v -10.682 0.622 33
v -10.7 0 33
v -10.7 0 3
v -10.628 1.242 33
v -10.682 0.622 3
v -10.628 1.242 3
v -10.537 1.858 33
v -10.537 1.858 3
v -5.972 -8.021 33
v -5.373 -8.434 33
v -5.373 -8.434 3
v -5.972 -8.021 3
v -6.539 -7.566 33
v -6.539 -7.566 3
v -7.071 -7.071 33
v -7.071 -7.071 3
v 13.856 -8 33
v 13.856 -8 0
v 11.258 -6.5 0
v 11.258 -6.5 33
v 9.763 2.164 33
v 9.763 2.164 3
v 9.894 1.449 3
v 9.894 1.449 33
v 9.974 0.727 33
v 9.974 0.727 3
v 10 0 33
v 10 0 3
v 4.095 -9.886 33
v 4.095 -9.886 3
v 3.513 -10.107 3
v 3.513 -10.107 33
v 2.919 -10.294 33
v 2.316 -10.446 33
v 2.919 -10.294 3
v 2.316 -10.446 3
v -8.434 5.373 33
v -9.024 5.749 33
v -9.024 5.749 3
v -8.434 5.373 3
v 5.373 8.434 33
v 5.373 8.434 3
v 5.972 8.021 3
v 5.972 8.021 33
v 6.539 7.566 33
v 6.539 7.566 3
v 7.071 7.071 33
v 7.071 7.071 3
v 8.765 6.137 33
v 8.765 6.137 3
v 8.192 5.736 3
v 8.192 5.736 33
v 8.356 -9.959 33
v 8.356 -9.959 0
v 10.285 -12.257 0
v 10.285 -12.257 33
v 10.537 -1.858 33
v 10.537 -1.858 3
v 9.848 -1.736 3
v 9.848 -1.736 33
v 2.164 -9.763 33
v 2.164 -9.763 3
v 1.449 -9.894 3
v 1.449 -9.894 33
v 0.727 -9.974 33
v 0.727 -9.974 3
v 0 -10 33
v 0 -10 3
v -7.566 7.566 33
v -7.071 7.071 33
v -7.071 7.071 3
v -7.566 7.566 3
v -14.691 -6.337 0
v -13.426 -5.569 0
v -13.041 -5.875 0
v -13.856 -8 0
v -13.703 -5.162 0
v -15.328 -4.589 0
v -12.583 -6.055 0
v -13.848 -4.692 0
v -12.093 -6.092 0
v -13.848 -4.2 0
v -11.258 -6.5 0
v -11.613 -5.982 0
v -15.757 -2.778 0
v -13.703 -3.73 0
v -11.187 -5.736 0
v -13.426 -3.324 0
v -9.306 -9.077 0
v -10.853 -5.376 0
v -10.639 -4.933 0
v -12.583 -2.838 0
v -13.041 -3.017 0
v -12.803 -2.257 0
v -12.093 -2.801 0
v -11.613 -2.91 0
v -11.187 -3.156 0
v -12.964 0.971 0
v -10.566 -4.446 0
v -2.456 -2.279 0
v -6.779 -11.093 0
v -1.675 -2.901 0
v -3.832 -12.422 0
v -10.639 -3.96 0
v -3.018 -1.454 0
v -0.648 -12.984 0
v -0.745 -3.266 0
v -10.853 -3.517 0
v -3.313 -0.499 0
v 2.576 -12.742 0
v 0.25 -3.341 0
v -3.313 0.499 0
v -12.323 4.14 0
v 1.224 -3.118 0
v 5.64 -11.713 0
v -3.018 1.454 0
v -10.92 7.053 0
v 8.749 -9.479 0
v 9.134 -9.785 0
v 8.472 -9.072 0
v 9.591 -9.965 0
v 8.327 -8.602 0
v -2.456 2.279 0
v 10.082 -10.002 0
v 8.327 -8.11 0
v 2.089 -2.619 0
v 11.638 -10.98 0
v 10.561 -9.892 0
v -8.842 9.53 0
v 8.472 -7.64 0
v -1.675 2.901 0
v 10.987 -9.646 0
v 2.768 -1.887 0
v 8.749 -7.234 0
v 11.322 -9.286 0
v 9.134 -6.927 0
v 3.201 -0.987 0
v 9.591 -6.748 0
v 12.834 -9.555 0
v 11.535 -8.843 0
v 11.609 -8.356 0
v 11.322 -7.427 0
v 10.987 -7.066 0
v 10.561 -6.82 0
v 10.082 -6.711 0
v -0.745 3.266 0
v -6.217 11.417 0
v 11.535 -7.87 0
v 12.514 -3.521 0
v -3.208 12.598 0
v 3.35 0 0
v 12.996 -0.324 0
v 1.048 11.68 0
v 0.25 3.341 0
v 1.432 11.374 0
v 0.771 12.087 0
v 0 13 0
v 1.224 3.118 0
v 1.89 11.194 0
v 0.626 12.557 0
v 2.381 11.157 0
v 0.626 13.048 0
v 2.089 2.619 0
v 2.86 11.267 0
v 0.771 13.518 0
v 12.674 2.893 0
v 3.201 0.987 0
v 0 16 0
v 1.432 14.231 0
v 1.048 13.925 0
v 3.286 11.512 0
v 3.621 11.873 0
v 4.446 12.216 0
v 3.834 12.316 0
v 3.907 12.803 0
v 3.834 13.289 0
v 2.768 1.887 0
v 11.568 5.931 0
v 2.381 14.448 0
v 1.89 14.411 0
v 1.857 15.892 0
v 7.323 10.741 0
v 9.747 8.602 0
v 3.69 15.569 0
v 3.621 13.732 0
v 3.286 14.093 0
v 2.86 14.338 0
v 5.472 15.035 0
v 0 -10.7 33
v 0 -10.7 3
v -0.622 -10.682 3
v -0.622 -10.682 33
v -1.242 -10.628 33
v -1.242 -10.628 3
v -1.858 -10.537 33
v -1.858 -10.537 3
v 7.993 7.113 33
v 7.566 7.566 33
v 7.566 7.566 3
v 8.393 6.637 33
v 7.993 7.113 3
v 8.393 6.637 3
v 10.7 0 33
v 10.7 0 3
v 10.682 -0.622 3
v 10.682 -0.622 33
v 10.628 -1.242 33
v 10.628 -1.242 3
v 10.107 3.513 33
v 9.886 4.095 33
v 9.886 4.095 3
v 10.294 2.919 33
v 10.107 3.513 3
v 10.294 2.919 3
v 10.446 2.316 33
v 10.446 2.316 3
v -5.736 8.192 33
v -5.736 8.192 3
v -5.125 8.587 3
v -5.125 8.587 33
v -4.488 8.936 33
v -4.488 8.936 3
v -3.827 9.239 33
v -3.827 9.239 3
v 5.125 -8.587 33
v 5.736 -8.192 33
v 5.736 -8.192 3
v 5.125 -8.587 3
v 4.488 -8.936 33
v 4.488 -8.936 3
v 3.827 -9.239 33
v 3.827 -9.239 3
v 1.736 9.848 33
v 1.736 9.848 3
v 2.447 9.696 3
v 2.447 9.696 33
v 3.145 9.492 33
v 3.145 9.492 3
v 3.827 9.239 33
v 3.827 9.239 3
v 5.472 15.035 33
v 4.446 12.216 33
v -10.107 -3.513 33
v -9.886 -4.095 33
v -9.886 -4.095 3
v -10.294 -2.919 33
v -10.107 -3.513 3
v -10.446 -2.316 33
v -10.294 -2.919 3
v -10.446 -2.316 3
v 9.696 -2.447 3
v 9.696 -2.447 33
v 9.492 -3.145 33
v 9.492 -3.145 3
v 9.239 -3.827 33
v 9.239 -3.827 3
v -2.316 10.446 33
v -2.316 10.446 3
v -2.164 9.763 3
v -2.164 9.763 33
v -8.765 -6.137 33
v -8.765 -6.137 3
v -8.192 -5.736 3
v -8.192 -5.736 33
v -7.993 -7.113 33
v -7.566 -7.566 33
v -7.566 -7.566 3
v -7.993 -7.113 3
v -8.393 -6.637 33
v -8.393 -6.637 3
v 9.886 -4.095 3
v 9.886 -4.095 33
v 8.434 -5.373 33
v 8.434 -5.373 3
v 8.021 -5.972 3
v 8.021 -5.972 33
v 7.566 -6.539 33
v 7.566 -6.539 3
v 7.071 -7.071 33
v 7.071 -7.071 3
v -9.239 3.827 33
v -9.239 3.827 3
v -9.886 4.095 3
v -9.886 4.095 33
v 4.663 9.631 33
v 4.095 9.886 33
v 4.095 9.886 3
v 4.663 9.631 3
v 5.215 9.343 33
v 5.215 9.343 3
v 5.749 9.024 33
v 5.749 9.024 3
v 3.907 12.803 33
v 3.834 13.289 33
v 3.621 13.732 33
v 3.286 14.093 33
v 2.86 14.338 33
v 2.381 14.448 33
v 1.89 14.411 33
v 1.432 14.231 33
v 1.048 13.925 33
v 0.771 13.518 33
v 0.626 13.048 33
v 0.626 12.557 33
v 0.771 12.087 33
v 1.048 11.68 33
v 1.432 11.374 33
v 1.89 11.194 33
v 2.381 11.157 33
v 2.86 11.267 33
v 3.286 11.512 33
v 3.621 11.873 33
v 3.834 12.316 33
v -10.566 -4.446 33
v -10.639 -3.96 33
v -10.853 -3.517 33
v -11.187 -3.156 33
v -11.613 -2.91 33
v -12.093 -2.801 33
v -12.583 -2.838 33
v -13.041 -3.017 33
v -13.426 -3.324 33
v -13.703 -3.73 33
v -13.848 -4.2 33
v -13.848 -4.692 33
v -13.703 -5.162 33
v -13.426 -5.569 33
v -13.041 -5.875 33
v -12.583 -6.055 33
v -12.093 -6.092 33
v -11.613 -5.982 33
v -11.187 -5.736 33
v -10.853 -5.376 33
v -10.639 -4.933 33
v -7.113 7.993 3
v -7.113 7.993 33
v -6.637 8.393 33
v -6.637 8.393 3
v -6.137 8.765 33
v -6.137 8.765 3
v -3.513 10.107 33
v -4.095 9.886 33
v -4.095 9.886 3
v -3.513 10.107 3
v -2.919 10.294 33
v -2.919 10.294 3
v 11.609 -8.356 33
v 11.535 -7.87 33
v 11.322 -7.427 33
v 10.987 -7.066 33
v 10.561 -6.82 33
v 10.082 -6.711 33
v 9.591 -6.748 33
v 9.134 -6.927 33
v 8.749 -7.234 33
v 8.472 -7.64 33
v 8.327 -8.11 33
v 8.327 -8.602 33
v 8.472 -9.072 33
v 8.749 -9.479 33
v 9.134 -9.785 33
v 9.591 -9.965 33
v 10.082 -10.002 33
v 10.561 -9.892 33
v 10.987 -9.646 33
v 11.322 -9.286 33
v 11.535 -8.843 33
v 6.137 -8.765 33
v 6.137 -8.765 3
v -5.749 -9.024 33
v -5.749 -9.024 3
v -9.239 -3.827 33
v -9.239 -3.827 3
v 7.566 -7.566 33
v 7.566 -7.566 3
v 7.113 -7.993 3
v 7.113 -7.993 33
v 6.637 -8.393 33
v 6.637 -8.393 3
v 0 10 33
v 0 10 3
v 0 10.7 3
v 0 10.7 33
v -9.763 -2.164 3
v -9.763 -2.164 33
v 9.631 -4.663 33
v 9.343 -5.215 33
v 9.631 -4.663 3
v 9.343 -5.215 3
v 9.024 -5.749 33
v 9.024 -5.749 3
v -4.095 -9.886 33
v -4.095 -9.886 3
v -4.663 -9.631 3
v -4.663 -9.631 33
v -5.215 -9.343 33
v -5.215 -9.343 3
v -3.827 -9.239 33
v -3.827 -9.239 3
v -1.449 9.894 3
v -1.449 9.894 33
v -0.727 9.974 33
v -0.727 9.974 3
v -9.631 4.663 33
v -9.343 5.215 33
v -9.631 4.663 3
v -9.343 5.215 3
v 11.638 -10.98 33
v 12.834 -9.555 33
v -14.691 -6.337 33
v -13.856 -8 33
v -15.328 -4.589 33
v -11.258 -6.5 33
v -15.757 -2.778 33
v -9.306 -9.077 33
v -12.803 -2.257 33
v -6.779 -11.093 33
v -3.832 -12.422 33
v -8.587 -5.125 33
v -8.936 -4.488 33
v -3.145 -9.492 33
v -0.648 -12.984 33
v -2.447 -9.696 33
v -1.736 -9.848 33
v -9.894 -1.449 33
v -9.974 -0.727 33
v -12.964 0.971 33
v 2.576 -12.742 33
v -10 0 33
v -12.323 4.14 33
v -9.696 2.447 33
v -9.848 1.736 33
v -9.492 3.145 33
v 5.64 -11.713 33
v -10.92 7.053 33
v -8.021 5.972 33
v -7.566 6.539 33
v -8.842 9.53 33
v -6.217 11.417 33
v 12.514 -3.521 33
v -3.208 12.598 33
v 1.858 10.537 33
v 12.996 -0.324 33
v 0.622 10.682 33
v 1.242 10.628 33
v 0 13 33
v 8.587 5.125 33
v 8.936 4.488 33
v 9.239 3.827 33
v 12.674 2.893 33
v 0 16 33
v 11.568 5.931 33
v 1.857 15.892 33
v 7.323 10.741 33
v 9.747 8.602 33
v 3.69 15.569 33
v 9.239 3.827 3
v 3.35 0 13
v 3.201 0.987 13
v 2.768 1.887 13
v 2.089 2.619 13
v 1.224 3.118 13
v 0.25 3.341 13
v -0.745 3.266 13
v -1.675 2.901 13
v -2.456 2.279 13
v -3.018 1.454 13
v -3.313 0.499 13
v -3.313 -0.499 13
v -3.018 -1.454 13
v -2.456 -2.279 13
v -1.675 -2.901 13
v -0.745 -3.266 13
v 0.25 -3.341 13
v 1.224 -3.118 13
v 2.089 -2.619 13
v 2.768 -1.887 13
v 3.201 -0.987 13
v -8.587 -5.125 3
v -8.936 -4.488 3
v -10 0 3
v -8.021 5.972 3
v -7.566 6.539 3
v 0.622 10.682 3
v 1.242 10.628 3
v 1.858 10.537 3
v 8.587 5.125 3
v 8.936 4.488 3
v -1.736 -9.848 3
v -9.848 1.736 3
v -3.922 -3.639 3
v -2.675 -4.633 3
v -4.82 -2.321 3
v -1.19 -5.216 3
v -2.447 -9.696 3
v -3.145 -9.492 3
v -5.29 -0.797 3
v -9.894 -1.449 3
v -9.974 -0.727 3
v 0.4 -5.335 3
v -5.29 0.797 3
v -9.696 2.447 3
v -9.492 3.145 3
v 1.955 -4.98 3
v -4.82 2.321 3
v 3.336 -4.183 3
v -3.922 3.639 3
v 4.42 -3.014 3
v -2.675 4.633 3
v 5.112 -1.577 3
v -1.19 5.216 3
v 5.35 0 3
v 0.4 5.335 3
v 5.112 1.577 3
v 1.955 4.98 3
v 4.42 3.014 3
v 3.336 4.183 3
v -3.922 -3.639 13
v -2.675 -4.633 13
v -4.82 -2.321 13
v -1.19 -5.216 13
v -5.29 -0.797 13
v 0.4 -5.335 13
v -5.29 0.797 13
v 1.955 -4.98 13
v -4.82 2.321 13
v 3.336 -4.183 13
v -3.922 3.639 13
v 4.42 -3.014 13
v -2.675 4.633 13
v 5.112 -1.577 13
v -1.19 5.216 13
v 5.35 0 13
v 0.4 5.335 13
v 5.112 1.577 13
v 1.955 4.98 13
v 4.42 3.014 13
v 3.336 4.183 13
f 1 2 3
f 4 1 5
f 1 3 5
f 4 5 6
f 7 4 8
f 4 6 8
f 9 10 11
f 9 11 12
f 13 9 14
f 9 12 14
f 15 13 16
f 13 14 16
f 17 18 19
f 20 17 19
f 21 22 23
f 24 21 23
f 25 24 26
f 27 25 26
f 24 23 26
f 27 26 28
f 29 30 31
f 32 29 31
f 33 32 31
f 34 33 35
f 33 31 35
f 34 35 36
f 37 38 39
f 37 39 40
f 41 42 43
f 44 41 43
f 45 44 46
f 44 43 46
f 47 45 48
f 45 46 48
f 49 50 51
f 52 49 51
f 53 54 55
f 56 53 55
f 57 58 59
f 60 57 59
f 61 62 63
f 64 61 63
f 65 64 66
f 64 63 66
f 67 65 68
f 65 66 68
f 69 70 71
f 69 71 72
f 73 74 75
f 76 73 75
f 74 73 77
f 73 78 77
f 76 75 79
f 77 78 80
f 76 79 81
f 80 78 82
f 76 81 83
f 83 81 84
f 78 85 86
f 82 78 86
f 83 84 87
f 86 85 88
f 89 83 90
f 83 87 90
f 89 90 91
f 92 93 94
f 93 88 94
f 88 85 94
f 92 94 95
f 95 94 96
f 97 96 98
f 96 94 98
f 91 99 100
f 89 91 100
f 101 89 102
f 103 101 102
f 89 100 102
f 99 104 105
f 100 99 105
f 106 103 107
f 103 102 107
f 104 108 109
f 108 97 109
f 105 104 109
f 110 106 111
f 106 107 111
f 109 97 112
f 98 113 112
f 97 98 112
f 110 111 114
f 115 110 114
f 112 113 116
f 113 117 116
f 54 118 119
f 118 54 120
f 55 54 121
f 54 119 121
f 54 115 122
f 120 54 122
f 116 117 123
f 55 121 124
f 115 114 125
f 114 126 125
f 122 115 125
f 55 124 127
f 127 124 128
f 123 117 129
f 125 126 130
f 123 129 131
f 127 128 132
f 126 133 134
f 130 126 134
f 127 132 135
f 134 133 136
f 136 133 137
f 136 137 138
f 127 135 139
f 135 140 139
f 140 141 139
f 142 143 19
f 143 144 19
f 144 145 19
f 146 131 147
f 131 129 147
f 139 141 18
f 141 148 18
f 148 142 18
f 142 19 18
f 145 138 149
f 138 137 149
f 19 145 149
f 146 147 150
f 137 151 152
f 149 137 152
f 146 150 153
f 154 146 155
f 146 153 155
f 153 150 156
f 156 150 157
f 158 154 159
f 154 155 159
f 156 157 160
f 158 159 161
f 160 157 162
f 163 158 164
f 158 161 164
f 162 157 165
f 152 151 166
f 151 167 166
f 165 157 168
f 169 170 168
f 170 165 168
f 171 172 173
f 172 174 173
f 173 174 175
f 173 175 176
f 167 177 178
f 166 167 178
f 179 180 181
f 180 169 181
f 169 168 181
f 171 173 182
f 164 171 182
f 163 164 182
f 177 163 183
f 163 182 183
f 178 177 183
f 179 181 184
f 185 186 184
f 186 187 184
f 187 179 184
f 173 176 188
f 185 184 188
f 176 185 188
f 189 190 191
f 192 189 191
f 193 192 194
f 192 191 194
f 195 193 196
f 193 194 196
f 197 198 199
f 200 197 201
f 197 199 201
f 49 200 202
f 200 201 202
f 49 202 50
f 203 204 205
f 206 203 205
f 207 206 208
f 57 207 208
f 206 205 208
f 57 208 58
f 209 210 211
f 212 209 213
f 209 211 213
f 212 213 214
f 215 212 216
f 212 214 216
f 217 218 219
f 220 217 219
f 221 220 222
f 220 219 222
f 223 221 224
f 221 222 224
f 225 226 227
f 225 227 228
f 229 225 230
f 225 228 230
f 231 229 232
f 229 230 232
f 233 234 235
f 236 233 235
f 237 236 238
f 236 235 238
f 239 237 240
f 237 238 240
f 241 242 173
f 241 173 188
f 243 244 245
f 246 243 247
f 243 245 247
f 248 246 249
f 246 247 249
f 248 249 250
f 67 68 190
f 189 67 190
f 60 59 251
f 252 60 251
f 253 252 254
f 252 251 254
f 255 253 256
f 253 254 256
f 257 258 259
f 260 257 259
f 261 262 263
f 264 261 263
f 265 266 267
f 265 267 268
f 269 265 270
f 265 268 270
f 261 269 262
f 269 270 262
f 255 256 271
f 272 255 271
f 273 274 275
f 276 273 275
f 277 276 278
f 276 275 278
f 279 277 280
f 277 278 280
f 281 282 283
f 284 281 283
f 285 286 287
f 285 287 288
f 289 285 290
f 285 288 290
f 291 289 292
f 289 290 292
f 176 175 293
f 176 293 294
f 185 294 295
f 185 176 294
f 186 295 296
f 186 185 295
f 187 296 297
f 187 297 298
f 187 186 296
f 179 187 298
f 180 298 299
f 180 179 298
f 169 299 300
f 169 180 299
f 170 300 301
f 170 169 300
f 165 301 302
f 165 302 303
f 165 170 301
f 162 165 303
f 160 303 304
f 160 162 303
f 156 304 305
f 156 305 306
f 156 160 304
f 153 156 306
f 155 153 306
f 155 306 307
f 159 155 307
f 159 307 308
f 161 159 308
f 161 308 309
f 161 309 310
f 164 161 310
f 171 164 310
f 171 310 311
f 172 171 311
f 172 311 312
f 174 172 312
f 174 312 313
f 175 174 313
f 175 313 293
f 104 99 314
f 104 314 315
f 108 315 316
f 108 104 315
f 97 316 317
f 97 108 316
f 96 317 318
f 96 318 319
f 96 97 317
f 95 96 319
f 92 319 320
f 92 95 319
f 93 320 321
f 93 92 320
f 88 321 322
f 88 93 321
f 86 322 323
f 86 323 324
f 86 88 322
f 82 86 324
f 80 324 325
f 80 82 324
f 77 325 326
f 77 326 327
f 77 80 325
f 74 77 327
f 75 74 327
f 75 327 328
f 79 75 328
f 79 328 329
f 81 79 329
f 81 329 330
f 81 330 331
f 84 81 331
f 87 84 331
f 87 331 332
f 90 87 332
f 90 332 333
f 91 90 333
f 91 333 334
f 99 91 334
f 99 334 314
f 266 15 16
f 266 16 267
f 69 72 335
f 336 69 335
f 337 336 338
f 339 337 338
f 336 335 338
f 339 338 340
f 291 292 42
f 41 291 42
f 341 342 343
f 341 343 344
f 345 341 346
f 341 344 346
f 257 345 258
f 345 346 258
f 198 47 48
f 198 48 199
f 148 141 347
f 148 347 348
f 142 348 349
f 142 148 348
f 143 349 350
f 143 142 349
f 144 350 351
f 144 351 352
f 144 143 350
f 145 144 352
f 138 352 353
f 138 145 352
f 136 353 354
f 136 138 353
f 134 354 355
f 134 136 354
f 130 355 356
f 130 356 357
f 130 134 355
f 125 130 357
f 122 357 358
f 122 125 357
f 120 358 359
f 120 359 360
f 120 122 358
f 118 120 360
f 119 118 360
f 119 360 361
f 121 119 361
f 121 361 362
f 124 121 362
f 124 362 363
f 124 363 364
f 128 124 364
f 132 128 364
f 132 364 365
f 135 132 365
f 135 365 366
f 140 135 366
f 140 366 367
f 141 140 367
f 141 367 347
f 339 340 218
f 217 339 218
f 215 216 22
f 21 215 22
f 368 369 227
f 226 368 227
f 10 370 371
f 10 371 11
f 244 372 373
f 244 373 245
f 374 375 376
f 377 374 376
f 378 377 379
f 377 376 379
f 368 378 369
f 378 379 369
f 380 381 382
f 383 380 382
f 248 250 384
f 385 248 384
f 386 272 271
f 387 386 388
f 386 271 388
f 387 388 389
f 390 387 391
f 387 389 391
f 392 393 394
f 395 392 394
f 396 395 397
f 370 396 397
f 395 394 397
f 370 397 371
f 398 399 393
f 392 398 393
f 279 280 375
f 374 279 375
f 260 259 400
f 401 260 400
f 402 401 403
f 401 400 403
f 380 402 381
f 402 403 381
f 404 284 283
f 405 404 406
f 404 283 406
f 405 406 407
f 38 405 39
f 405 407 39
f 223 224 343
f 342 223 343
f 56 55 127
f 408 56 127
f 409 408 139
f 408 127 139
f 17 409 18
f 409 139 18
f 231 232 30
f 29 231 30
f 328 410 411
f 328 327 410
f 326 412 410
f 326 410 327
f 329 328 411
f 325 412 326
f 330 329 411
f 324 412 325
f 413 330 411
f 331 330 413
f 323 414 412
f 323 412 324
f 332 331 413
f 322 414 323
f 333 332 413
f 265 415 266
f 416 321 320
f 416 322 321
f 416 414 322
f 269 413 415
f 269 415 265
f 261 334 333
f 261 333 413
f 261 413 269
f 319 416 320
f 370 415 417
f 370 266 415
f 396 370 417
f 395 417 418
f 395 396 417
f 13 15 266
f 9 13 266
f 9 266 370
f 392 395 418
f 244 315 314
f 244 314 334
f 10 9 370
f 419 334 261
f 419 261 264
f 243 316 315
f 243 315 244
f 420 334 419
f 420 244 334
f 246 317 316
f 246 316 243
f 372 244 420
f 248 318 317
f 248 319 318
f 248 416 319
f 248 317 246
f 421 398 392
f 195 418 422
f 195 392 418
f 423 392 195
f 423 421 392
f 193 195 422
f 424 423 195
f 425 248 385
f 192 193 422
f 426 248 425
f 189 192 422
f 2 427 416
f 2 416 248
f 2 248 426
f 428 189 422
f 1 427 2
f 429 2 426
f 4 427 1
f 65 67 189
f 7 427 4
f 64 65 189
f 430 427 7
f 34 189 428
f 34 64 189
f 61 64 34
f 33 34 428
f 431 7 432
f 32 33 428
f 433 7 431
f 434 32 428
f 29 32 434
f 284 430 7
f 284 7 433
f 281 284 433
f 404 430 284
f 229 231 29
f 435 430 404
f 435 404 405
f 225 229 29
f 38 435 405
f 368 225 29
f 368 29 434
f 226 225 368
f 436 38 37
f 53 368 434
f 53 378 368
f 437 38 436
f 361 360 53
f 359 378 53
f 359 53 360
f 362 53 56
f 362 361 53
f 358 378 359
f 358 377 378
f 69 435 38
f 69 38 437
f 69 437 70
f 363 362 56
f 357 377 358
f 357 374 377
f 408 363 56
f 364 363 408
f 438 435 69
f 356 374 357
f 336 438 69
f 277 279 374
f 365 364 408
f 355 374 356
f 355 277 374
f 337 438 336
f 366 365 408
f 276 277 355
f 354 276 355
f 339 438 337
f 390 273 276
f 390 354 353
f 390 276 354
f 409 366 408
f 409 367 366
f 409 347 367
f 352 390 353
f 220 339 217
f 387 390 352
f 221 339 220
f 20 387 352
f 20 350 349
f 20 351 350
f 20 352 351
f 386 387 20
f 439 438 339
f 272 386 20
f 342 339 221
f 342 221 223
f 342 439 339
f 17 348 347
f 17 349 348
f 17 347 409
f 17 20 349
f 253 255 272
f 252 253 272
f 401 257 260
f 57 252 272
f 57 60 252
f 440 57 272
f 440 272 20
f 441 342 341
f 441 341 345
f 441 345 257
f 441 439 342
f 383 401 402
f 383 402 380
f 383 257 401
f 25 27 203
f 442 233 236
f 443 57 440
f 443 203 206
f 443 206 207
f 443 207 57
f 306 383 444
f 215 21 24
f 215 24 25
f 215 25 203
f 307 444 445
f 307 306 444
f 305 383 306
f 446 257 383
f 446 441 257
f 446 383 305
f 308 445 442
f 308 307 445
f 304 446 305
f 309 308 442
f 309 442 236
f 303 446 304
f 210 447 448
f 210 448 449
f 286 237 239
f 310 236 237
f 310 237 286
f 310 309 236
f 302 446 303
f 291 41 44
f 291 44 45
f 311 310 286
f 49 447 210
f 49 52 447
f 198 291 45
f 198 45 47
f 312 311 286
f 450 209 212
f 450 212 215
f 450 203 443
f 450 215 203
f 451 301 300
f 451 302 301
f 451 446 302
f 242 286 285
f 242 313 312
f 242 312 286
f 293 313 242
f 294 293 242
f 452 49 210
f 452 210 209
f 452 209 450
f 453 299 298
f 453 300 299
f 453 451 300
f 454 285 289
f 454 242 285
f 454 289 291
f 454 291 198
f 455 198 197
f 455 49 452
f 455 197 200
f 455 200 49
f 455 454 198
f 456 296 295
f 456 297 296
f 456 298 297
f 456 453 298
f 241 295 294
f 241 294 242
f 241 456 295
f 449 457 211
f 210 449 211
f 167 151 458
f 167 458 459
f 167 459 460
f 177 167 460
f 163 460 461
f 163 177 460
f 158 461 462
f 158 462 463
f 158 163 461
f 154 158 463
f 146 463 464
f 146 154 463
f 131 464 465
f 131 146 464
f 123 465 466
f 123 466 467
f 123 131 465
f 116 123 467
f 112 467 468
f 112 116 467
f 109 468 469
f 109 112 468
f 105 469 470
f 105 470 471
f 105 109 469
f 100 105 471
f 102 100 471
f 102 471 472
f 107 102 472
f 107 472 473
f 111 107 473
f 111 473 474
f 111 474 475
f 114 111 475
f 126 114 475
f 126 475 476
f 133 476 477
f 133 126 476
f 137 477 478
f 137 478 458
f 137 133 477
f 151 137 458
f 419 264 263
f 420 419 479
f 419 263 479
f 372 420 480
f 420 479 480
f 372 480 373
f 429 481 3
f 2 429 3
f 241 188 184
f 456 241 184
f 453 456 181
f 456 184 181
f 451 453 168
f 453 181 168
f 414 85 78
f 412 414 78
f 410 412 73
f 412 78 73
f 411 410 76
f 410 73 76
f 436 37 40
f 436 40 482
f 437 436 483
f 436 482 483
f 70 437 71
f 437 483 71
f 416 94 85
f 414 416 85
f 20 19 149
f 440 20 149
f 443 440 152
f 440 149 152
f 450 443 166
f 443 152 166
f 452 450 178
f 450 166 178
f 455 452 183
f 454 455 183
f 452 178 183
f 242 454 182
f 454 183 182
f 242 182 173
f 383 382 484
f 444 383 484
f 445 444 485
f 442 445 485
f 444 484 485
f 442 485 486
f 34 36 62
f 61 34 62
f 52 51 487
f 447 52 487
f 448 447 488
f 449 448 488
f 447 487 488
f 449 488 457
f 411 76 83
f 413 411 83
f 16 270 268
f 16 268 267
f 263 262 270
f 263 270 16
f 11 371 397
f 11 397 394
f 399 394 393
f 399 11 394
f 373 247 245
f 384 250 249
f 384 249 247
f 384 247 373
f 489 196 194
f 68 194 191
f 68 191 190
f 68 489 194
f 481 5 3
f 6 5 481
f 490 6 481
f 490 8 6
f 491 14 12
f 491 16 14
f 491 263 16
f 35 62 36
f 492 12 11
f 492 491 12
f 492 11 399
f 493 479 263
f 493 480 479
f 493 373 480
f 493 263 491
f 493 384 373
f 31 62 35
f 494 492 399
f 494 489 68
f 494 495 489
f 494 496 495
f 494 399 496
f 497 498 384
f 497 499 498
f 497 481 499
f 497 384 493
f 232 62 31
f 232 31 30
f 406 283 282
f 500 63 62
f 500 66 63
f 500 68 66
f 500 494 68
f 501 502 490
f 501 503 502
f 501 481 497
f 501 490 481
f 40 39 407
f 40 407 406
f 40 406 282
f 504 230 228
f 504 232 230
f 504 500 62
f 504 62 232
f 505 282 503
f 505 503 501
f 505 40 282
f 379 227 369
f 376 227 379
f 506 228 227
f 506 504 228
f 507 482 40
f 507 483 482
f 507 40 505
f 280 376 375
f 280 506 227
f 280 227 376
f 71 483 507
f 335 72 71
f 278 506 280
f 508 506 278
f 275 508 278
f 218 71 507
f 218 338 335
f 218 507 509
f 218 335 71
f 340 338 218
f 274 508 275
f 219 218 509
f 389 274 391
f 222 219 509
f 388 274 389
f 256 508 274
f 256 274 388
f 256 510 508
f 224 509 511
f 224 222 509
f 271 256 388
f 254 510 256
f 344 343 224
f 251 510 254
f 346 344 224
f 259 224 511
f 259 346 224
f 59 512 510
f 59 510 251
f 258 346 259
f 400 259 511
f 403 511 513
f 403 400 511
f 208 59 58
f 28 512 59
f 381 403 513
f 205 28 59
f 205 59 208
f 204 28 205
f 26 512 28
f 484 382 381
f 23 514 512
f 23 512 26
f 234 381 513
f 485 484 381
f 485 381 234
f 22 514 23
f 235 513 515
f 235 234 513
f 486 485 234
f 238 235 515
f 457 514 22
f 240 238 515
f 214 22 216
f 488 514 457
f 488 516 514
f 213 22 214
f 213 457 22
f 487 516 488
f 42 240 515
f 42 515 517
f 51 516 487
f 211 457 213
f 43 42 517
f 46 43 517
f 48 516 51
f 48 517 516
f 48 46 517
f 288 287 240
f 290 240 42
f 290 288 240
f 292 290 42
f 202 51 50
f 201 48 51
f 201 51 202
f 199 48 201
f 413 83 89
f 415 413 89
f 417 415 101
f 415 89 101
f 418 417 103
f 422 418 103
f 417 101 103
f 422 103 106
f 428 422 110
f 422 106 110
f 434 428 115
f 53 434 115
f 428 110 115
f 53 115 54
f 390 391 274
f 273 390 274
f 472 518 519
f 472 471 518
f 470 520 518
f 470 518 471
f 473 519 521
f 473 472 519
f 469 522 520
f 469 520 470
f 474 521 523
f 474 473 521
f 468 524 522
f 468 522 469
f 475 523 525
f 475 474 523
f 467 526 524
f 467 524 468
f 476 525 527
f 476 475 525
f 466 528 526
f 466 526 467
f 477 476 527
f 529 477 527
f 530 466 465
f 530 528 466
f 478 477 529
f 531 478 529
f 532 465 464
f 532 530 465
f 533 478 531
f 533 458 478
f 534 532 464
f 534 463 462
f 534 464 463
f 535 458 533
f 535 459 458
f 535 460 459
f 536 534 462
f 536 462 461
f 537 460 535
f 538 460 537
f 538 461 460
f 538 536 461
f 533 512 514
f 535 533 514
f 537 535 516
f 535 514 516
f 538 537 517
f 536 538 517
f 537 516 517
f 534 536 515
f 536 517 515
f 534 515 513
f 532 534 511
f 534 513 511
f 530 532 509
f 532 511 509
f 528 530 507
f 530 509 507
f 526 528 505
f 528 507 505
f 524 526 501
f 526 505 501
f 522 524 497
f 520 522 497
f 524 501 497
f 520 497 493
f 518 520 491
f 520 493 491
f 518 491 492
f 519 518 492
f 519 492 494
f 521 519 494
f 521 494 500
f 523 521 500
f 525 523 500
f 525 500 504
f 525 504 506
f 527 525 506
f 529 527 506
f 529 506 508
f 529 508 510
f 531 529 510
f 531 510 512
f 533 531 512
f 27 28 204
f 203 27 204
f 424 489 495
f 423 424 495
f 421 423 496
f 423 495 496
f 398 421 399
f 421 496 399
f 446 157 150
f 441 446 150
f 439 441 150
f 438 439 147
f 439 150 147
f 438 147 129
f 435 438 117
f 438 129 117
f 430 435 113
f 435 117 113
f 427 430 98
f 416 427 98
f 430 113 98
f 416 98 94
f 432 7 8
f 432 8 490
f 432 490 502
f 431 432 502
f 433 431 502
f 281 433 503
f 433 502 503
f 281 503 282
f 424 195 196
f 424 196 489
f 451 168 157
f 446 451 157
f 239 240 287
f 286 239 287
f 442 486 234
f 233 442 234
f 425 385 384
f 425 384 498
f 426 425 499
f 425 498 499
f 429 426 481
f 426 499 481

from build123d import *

# Parameters (mm, degrees)
F0_R     = 1.65
F0_R_2   = 5.35
F1_DEPTH = 3
F2_DEPTH = 33
F0_R_3   = 3.35
F3_DEPTH = 13
F4_DEPTH = 3


with BuildPart() as f1:
    # F0 (on Top) → F1 (new body)
    with BuildSketch(Plane.XY):
        with BuildLine():
            Line((-13.8564064606, -8), (-11.2583302492, -6.5))
            ThreePointArc((-11.2583302492, -6.5), (-2.2574263097, -12.8025007892), (8.3562389259, -9.9585777605))
            Line((8.3562389259, -9.9585777605), (10.284601755, -12.2567110899))
            ThreePointArc((10.284601755, -12.2567110899), (12.2567110899, -10.284601755), (13.8564064606, -8))
            Line((13.8564064606, -8), (11.2583302492, -6.5))
            ThreePointArc((11.2583302492, -6.5), (12.2160040702, 4.4462618632), (4.4462618632, 12.2160040702))
            Line((4.4462618632, 12.2160040702), (5.4723222932, 15.0350819326))
            ThreePointArc((5.4723222932, 15.0350819326), (2.7783708427, 15.7569240482), (0, 16))
            Line((0, 16), (0, 13))
            ThreePointArc((0, 13), (-9.9585777605, 8.3562389259), (-12.8025007892, -2.2574263097))
            Line((-12.8025007892, -2.2574263097), (-15.7569240482, -2.7783708427))
            ThreePointArc((-15.7569240482, -2.7783708427), (-15.0350819326, -5.4723222932), (-13.8564064606, -8))
        make_face()
        with Locations((-12.2160040702, -4.4462618632)):
            Circle(F0_R, mode=Mode.SUBTRACT)
        with Locations((9.9585777605, -8.3562389259)):
            Circle(F0_R, mode=Mode.SUBTRACT)
        with BuildLine():
            ThreePointArc((-9.762960081, -2.1643960953), (-9.9405633847, -1.0886687261), (-10, 0))
            Line((-10, 0), (-10.7, 0))
            ThreePointArc((-10.7, 0), (-10.6592832696, 0.9325664474), (-10.5374429572, 1.858035501))
            Line((-10.5374429572, 1.858035501), (-9.8480775301, 1.7364817767))
            ThreePointArc((-9.8480775301, 1.7364817767), (-9.6004985434, 2.7982901418), (-9.238795324, 3.8268343264))
            Line((-9.238795324, 3.8268343264), (-9.8855109966, 4.0947127293))
            ThreePointArc((-9.8855109966, 4.0947127293), (-9.4910159135, 4.9407101645), (-9.0242884685, 5.749105812))
            Line((-9.0242884685, 5.749105812), (-8.4339144565, 5.372996086))
            ThreePointArc((-8.4339144565, 5.372996086), (-7.7988448281, 6.2592347254), (-7.0710678076, 7.0710678161))
            Line((-7.0710678076, 7.0710678161), (-7.5660425541, 7.5660425633))
            ThreePointArc((-7.5660425541, 7.5660425633), (-6.8778274187, 8.1966755455), (-6.1372678637, 8.7649268776))
            Line((-6.1372678637, 8.7649268776), (-5.7357643586, 8.1915204463))
            ThreePointArc((-5.7357643586, 8.1915204463), (-4.8098876826, 8.7672675607), (-3.8268343153, 9.2387953286))
            Line((-3.8268343153, 9.2387953286), (-4.0947127174, 9.8855110016))
            ThreePointArc((-4.0947127174, 9.8855110016), (-3.2175520455, 10.2047713759), (-2.3159038597, 10.4463672783))
            Line((-2.3159038597, 10.4463672783), (-2.1643961306, 9.7629600732))
            ThreePointArc((-2.1643961306, 9.7629600732), (-1.088668738, 9.9405633834), (1.21e-08, 10))
            Line((1.21e-08, 10), (1.29e-08, 10.7))
            ThreePointArc((1.29e-08, 10.7), (0.9325664602, 10.6592832685), (1.8580355137, 10.537442955))
            Line((1.8580355137, 10.537442955), (1.7364817885, 9.848077528))
            ThreePointArc((1.7364817885, 9.848077528), (2.7982901533, 9.6004985401), (3.8268343376, 9.2387953193))
            Line((3.8268343376, 9.2387953193), (4.0947127412, 9.8855109917))
            ThreePointArc((4.0947127412, 9.8855109917), (4.9407101759, 9.4910159076), (5.7491058229, 9.0242884615))
            Line((5.7491058229, 9.0242884615), (5.3729960962, 8.43391445))
            ThreePointArc((5.3729960962, 8.43391445), (6.2592347348, 7.7988448206), (7.0710678246, 7.0710677991))
            Line((7.0710678246, 7.0710677991), (7.5660425724, 7.566042545))
            ThreePointArc((7.5660425724, 7.566042545), (8.1966755538, 6.8778274088), (8.764926885, 6.1372678531))
            Line((8.764926885, 6.1372678531), (8.1915204533, 5.7357643487))
            ThreePointArc((8.1915204533, 5.7357643487), (8.7672675665, 4.809887672), (9.2387953332, 3.8268343042))
            Line((9.2387953332, 3.8268343042), (9.8855110065, 4.0947127055))
            ThreePointArc((9.8855110065, 4.0947127055), (10.2047713798, 3.2175520332), (10.4463672811, 2.3159038471))
            Line((10.4463672811, 2.3159038471), (9.7629600758, 2.1643961188))
            ThreePointArc((9.7629600758, 2.1643961188), (9.9405633847, 1.0886687261), (10, -2.41e-08))
            Line((10, -2.41e-08), (10.7, -2.58e-08))
            ThreePointArc((10.7, -2.58e-08), (10.6592832673, -0.9325664731), (10.5374429528, -1.8580355264))
            Line((10.5374429528, -1.8580355264), (9.8480775259, -1.7364818004))
            ThreePointArc((9.8480775259, -1.7364818004), (9.6004985367, -2.7982901649), (9.2387953147, -3.8268343487))
            Line((9.2387953147, -3.8268343487), (9.8855109868, -4.0947127531))
            ThreePointArc((9.8855109868, -4.0947127531), (9.4910159016, -4.9407101873), (9.0242884546, -5.7491058338))
            Line((9.0242884546, -5.7491058338), (8.4339144436, -5.3729961063))
            ThreePointArc((8.4339144436, -5.3729961063), (7.798844813, -6.2592347442), (7.0710677906, -7.0710678332))
            Line((7.0710677906, -7.0710678332), (7.5660425359, -7.5660425815))
            ThreePointArc((7.5660425359, -7.5660425815), (6.877827399, -8.1966755621), (6.1372678425, -8.7649268924))
            Line((6.1372678425, -8.7649268924), (5.7357643388, -8.1915204602))
            ThreePointArc((5.7357643388, -8.1915204602), (4.8098876615, -8.7672675723), (3.826834293, -9.2387953378))
            Line((3.826834293, -9.2387953378), (4.0947126935, -9.8855110114))
            ThreePointArc((4.0947126935, -9.8855110114), (3.2175520209, -10.2047713837), (2.3159038345, -10.4463672839))
            Line((2.3159038345, -10.4463672839), (2.164396107, -9.7629600784))
            ThreePointArc((2.164396107, -9.7629600784), (1.0886687141, -9.940563386), (-3.62e-08, -10))
            Line((-3.62e-08, -10), (-3.87e-08, -10.7))
            ThreePointArc((-3.87e-08, -10.7), (-0.9325664859, -10.6592832662), (-1.8580355391, -10.5374429505))
            Line((-1.8580355391, -10.5374429505), (-1.7364818123, -9.8480775238))
            ThreePointArc((-1.7364818123, -9.8480775238), (-2.7982901765, -9.6004985333), (-3.8268343598, -9.2387953101))
            Line((-3.8268343598, -9.2387953101), (-4.094712765, -9.8855109818))
            ThreePointArc((-4.094712765, -9.8855109818), (-4.9407101988, -9.4910158957), (-5.7491058447, -9.0242884477))
            Line((-5.7491058447, -9.0242884477), (-5.3729961165, -8.4339144371))
            ThreePointArc((-5.3729961165, -8.4339144371), (-6.2592347536, -7.7988448055), (-7.0710678417, -7.071067782))
            Line((-7.0710678417, -7.071067782), (-7.5660425906, -7.5660425268))
            ThreePointArc((-7.5660425906, -7.5660425268), (-8.1966755704, -6.8778273891), (-8.7649268998, -6.137267832))
            Line((-8.7649268998, -6.137267832), (-8.1915204671, -5.735764329))
            ThreePointArc((-8.1915204671, -5.735764329), (-8.7672675781, -4.8098876509), (-9.2387953424, -3.8268342819))
            Line((-9.2387953424, -3.8268342819), (-9.8855110164, -4.0947126816))
            ThreePointArc((-9.8855110164, -4.0947126816), (-10.2047713875, -3.2175520086), (-10.4463672866, -2.3159038219))
            Line((-10.4463672866, -2.3159038219), (-9.762960081, -2.1643960953))
        make_face(mode=Mode.SUBTRACT)
        with Locations((2.2574263097, 12.8025007892)):
            Circle(F0_R, mode=Mode.SUBTRACT)
        with BuildLine():
            Line((-10.7, 0), (-10, 0))
            ThreePointArc((-10, 0), (-9.9405633847, -1.0886687261), (-9.762960081, -2.1643960953))
            ThreePointArc((-9.762960081, -2.1643960953), (-9.5371695211, -3.0070579519), (-9.2387953424, -3.8268342819))
            ThreePointArc((-9.2387953424, -3.8268342819), (-8.7672675781, -4.8098876509), (-8.1915204671, -5.735764329))
            ThreePointArc((-8.1915204671, -5.735764329), (-7.6604444583, -6.4278760646), (-7.0710678417, -7.071067782))
            ThreePointArc((-7.0710678417, -7.071067782), (-6.2592347536, -7.7988448055), (-5.3729961165, -8.4339144371))
            ThreePointArc((-5.3729961165, -8.4339144371), (-4.6174861671, -8.8701083137), (-3.8268343598, -9.2387953101))
            ThreePointArc((-3.8268343598, -9.2387953101), (-2.7982901765, -9.6004985333), (-1.7364818123, -9.8480775238))
            ThreePointArc((-1.7364818123, -9.8480775238), (-0.8715574635, -9.9619469778), (-3.62e-08, -10))
            ThreePointArc((-3.62e-08, -10), (1.0886687141, -9.940563386), (2.164396107, -9.7629600784))
            ThreePointArc((2.164396107, -9.7629600784), (3.0070579634, -9.5371695174), (3.826834293, -9.2387953378))
            ThreePointArc((3.826834293, -9.2387953378), (4.8098876615, -8.7672675723), (5.7357643388, -8.1915204602))
            ThreePointArc((5.7357643388, -8.1915204602), (6.4278760738, -7.6604444506), (7.0710677906, -7.0710678332))
            ThreePointArc((7.0710677906, -7.0710678332), (7.798844813, -6.2592347442), (8.4339144436, -5.3729961063))
            ThreePointArc((8.4339144436, -5.3729961063), (8.8701083193, -4.6174861564), (9.2387953147, -3.8268343487))
            ThreePointArc((9.2387953147, -3.8268343487), (9.6004985367, -2.7982901649), (9.8480775259, -1.7364818004))
            ThreePointArc((9.8480775259, -1.7364818004), (9.9619469788, -0.8715574515), (10, -2.41e-08))
            ThreePointArc((10, -2.41e-08), (9.9405633847, 1.0886687261), (9.7629600758, 2.1643961188))
            ThreePointArc((9.7629600758, 2.1643961188), (9.5371695138, 3.0070579749), (9.2387953332, 3.8268343042))
            ThreePointArc((9.2387953332, 3.8268343042), (8.7672675665, 4.809887672), (8.1915204533, 5.7357643487))
            ThreePointArc((8.1915204533, 5.7357643487), (7.6604444428, 6.427876083), (7.0710678246, 7.0710677991))
            ThreePointArc((7.0710678246, 7.0710677991), (6.2592347348, 7.7988448206), (5.3729960962, 8.43391445))
            ThreePointArc((5.3729960962, 8.43391445), (4.6174861457, 8.8701083248), (3.8268343376, 9.2387953193))
            ThreePointArc((3.8268343376, 9.2387953193), (2.7982901533, 9.6004985401), (1.7364817885, 9.848077528))
            ThreePointArc((1.7364817885, 9.848077528), (0.8715574395, 9.9619469799), (1.21e-08, 10))
            ThreePointArc((1.21e-08, 10), (-1.088668738, 9.9405633834), (-2.1643961306, 9.7629600732))
            ThreePointArc((-2.1643961306, 9.7629600732), (-3.0070579864, 9.5371695102), (-3.8268343153, 9.2387953286))
            ThreePointArc((-3.8268343153, 9.2387953286), (-4.8098876826, 8.7672675607), (-5.7357643586, 8.1915204463))
            ThreePointArc((-5.7357643586, 8.1915204463), (-6.4278760922, 7.6604444351), (-7.0710678076, 7.0710678161))
            ThreePointArc((-7.0710678076, 7.0710678161), (-7.7988448281, 6.2592347254), (-8.4339144565, 5.372996086))
            ThreePointArc((-8.4339144565, 5.372996086), (-8.8701083304, 4.617486135), (-9.238795324, 3.8268343264))
            ThreePointArc((-9.238795324, 3.8268343264), (-9.6004985434, 2.7982901418), (-9.8480775301, 1.7364817767))
            Line((-9.8480775301, 1.7364817767), (-10.5374429572, 1.858035501))
            ThreePointArc((-10.5374429572, 1.858035501), (-10.6592832696, 0.9325664474), (-10.7, 0))
        make_face()
        Circle(F0_R_2, mode=Mode.SUBTRACT)
    extrude(amount=F1_DEPTH)

    # F0 (on Top) → F2 (join)
    with BuildSketch(Plane.XY):
        with BuildLine():
            Line((-13.8564064606, -8), (-11.2583302492, -6.5))
            ThreePointArc((-11.2583302492, -6.5), (-2.2574263097, -12.8025007892), (8.3562389259, -9.9585777605))
            Line((8.3562389259, -9.9585777605), (10.284601755, -12.2567110899))
            ThreePointArc((10.284601755, -12.2567110899), (12.2567110899, -10.284601755), (13.8564064606, -8))
            Line((13.8564064606, -8), (11.2583302492, -6.5))
            ThreePointArc((11.2583302492, -6.5), (12.2160040702, 4.4462618632), (4.4462618632, 12.2160040702))
            Line((4.4462618632, 12.2160040702), (5.4723222932, 15.0350819326))
            ThreePointArc((5.4723222932, 15.0350819326), (2.7783708427, 15.7569240482), (0, 16))
            Line((0, 16), (0, 13))
            ThreePointArc((0, 13), (-9.9585777605, 8.3562389259), (-12.8025007892, -2.2574263097))
            Line((-12.8025007892, -2.2574263097), (-15.7569240482, -2.7783708427))
            ThreePointArc((-15.7569240482, -2.7783708427), (-15.0350819326, -5.4723222932), (-13.8564064606, -8))
        make_face()
        with Locations((-12.2160040702, -4.4462618632)):
            Circle(F0_R, mode=Mode.SUBTRACT)
        with Locations((9.9585777605, -8.3562389259)):
            Circle(F0_R, mode=Mode.SUBTRACT)
        with BuildLine():
            ThreePointArc((-9.762960081, -2.1643960953), (-9.9405633847, -1.0886687261), (-10, 0))
            Line((-10, 0), (-10.7, 0))
            ThreePointArc((-10.7, 0), (-10.6592832696, 0.9325664474), (-10.5374429572, 1.858035501))
            Line((-10.5374429572, 1.858035501), (-9.8480775301, 1.7364817767))
            ThreePointArc((-9.8480775301, 1.7364817767), (-9.6004985434, 2.7982901418), (-9.238795324, 3.8268343264))
            Line((-9.238795324, 3.8268343264), (-9.8855109966, 4.0947127293))
            ThreePointArc((-9.8855109966, 4.0947127293), (-9.4910159135, 4.9407101645), (-9.0242884685, 5.749105812))
            Line((-9.0242884685, 5.749105812), (-8.4339144565, 5.372996086))
            ThreePointArc((-8.4339144565, 5.372996086), (-7.7988448281, 6.2592347254), (-7.0710678076, 7.0710678161))
            Line((-7.0710678076, 7.0710678161), (-7.5660425541, 7.5660425633))
            ThreePointArc((-7.5660425541, 7.5660425633), (-6.8778274187, 8.1966755455), (-6.1372678637, 8.7649268776))
            Line((-6.1372678637, 8.7649268776), (-5.7357643586, 8.1915204463))
            ThreePointArc((-5.7357643586, 8.1915204463), (-4.8098876826, 8.7672675607), (-3.8268343153, 9.2387953286))
            Line((-3.8268343153, 9.2387953286), (-4.0947127174, 9.8855110016))
            ThreePointArc((-4.0947127174, 9.8855110016), (-3.2175520455, 10.2047713759), (-2.3159038597, 10.4463672783))
            Line((-2.3159038597, 10.4463672783), (-2.1643961306, 9.7629600732))
            ThreePointArc((-2.1643961306, 9.7629600732), (-1.088668738, 9.9405633834), (1.21e-08, 10))
            Line((1.21e-08, 10), (1.29e-08, 10.7))
            ThreePointArc((1.29e-08, 10.7), (0.9325664602, 10.6592832685), (1.8580355137, 10.537442955))
            Line((1.8580355137, 10.537442955), (1.7364817885, 9.848077528))
            ThreePointArc((1.7364817885, 9.848077528), (2.7982901533, 9.6004985401), (3.8268343376, 9.2387953193))
            Line((3.8268343376, 9.2387953193), (4.0947127412, 9.8855109917))
            ThreePointArc((4.0947127412, 9.8855109917), (4.9407101759, 9.4910159076), (5.7491058229, 9.0242884615))
            Line((5.7491058229, 9.0242884615), (5.3729960962, 8.43391445))
            ThreePointArc((5.3729960962, 8.43391445), (6.2592347348, 7.7988448206), (7.0710678246, 7.0710677991))
            Line((7.0710678246, 7.0710677991), (7.5660425724, 7.566042545))
            ThreePointArc((7.5660425724, 7.566042545), (8.1966755538, 6.8778274088), (8.764926885, 6.1372678531))
            Line((8.764926885, 6.1372678531), (8.1915204533, 5.7357643487))
            ThreePointArc((8.1915204533, 5.7357643487), (8.7672675665, 4.809887672), (9.2387953332, 3.8268343042))
            Line((9.2387953332, 3.8268343042), (9.8855110065, 4.0947127055))
            ThreePointArc((9.8855110065, 4.0947127055), (10.2047713798, 3.2175520332), (10.4463672811, 2.3159038471))
            Line((10.4463672811, 2.3159038471), (9.7629600758, 2.1643961188))
            ThreePointArc((9.7629600758, 2.1643961188), (9.9405633847, 1.0886687261), (10, -2.41e-08))
            Line((10, -2.41e-08), (10.7, -2.58e-08))
            ThreePointArc((10.7, -2.58e-08), (10.6592832673, -0.9325664731), (10.5374429528, -1.8580355264))
            Line((10.5374429528, -1.8580355264), (9.8480775259, -1.7364818004))
            ThreePointArc((9.8480775259, -1.7364818004), (9.6004985367, -2.7982901649), (9.2387953147, -3.8268343487))
            Line((9.2387953147, -3.8268343487), (9.8855109868, -4.0947127531))
            ThreePointArc((9.8855109868, -4.0947127531), (9.4910159016, -4.9407101873), (9.0242884546, -5.7491058338))
            Line((9.0242884546, -5.7491058338), (8.4339144436, -5.3729961063))
            ThreePointArc((8.4339144436, -5.3729961063), (7.798844813, -6.2592347442), (7.0710677906, -7.0710678332))
            Line((7.0710677906, -7.0710678332), (7.5660425359, -7.5660425815))
            ThreePointArc((7.5660425359, -7.5660425815), (6.877827399, -8.1966755621), (6.1372678425, -8.7649268924))
            Line((6.1372678425, -8.7649268924), (5.7357643388, -8.1915204602))
            ThreePointArc((5.7357643388, -8.1915204602), (4.8098876615, -8.7672675723), (3.826834293, -9.2387953378))
            Line((3.826834293, -9.2387953378), (4.0947126935, -9.8855110114))
            ThreePointArc((4.0947126935, -9.8855110114), (3.2175520209, -10.2047713837), (2.3159038345, -10.4463672839))
            Line((2.3159038345, -10.4463672839), (2.164396107, -9.7629600784))
            ThreePointArc((2.164396107, -9.7629600784), (1.0886687141, -9.940563386), (-3.62e-08, -10))
            Line((-3.62e-08, -10), (-3.87e-08, -10.7))
            ThreePointArc((-3.87e-08, -10.7), (-0.9325664859, -10.6592832662), (-1.8580355391, -10.5374429505))
            Line((-1.8580355391, -10.5374429505), (-1.7364818123, -9.8480775238))
            ThreePointArc((-1.7364818123, -9.8480775238), (-2.7982901765, -9.6004985333), (-3.8268343598, -9.2387953101))
            Line((-3.8268343598, -9.2387953101), (-4.094712765, -9.8855109818))
            ThreePointArc((-4.094712765, -9.8855109818), (-4.9407101988, -9.4910158957), (-5.7491058447, -9.0242884477))
            Line((-5.7491058447, -9.0242884477), (-5.3729961165, -8.4339144371))
            ThreePointArc((-5.3729961165, -8.4339144371), (-6.2592347536, -7.7988448055), (-7.0710678417, -7.071067782))
            Line((-7.0710678417, -7.071067782), (-7.5660425906, -7.5660425268))
            ThreePointArc((-7.5660425906, -7.5660425268), (-8.1966755704, -6.8778273891), (-8.7649268998, -6.137267832))
            Line((-8.7649268998, -6.137267832), (-8.1915204671, -5.735764329))
            ThreePointArc((-8.1915204671, -5.735764329), (-8.7672675781, -4.8098876509), (-9.2387953424, -3.8268342819))
            Line((-9.2387953424, -3.8268342819), (-9.8855110164, -4.0947126816))
            ThreePointArc((-9.8855110164, -4.0947126816), (-10.2047713875, -3.2175520086), (-10.4463672866, -2.3159038219))
            Line((-10.4463672866, -2.3159038219), (-9.762960081, -2.1643960953))
        make_face(mode=Mode.SUBTRACT)
        with Locations((2.2574263097, 12.8025007892)):
            Circle(F0_R, mode=Mode.SUBTRACT)
    extrude(amount=F2_DEPTH)

    # F0 (on Top) → F3 (join)
    with BuildSketch(Plane.XY):
        Circle(F0_R_2)
        Circle(F0_R_3, mode=Mode.SUBTRACT)
    extrude(amount=F3_DEPTH)

    # F0 (on Top) → F4 (join)
    with BuildSketch(Plane.XY):
        with BuildLine():
            Line((1.29e-08, 10.7), (1.21e-08, 10))
            ThreePointArc((1.21e-08, 10), (0.8715574395, 9.9619469799), (1.7364817885, 9.848077528))
            Line((1.7364817885, 9.848077528), (1.8580355137, 10.537442955))
            ThreePointArc((1.8580355137, 10.537442955), (0.9325664602, 10.6592832685), (1.29e-08, 10.7))
        make_face()
        with BuildLine():
            Line((-4.0947127174, 9.8855110016), (-3.8268343153, 9.2387953286))
            ThreePointArc((-3.8268343153, 9.2387953286), (-3.0070579864, 9.5371695102), (-2.1643961306, 9.7629600732))
            Line((-2.1643961306, 9.7629600732), (-2.3159038597, 10.4463672783))
            ThreePointArc((-2.3159038597, 10.4463672783), (-3.2175520455, 10.2047713759), (-4.0947127174, 9.8855110016))
        make_face()
        with BuildLine():
            Line((-7.5660425541, 7.5660425633), (-7.0710678076, 7.0710678161))
            ThreePointArc((-7.0710678076, 7.0710678161), (-6.4278760922, 7.6604444351), (-5.7357643586, 8.1915204463))
            Line((-5.7357643586, 8.1915204463), (-6.1372678637, 8.7649268776))
            ThreePointArc((-6.1372678637, 8.7649268776), (-6.8778274187, 8.1966755455), (-7.5660425541, 7.5660425633))
        make_face()
        with BuildLine():
            Line((-9.8855109966, 4.0947127293), (-9.238795324, 3.8268343264))
            ThreePointArc((-9.238795324, 3.8268343264), (-8.8701083304, 4.617486135), (-8.4339144565, 5.372996086))
            Line((-8.4339144565, 5.372996086), (-9.0242884685, 5.749105812))
            ThreePointArc((-9.0242884685, 5.749105812), (-9.4910159135, 4.9407101645), (-9.8855109966, 4.0947127293))
        make_face()
        with BuildLine():
            Line((4.0947127412, 9.8855109917), (3.8268343376, 9.2387953193))
            ThreePointArc((3.8268343376, 9.2387953193), (4.6174861457, 8.8701083248), (5.3729960962, 8.43391445))
            Line((5.3729960962, 8.43391445), (5.7491058229, 9.0242884615))
            ThreePointArc((5.7491058229, 9.0242884615), (4.9407101759, 9.4910159076), (4.0947127412, 9.8855109917))
        make_face()
        with BuildLine():
            Line((7.5660425724, 7.566042545), (7.0710678246, 7.0710677991))
            ThreePointArc((7.0710678246, 7.0710677991), (7.6604444428, 6.427876083), (8.1915204533, 5.7357643487))
            Line((8.1915204533, 5.7357643487), (8.764926885, 6.1372678531))
            ThreePointArc((8.764926885, 6.1372678531), (8.1966755538, 6.8778274088), (7.5660425724, 7.566042545))
        make_face()
        with BuildLine():
            Line((9.8855110065, 4.0947127055), (9.2387953332, 3.8268343042))
            ThreePointArc((9.2387953332, 3.8268343042), (9.5371695138, 3.0070579749), (9.7629600758, 2.1643961188))
            Line((9.7629600758, 2.1643961188), (10.4463672811, 2.3159038471))
            ThreePointArc((10.4463672811, 2.3159038471), (10.2047713798, 3.2175520332), (9.8855110065, 4.0947127055))
        make_face()
        with BuildLine():
            ThreePointArc((10, -2.41e-08), (9.9619469788, -0.8715574515), (9.8480775259, -1.7364818004))
            Line((9.8480775259, -1.7364818004), (10.5374429528, -1.8580355264))
            ThreePointArc((10.5374429528, -1.8580355264), (10.6592832673, -0.9325664731), (10.7, -2.58e-08))
            Line((10.7, -2.58e-08), (10, -2.41e-08))
        make_face()
        with BuildLine():
            ThreePointArc((9.2387953147, -3.8268343487), (8.8701083193, -4.6174861564), (8.4339144436, -5.3729961063))
            Line((8.4339144436, -5.3729961063), (9.0242884546, -5.7491058338))
            ThreePointArc((9.0242884546, -5.7491058338), (9.4910159016, -4.9407101873), (9.8855109868, -4.0947127531))
            Line((9.8855109868, -4.0947127531), (9.2387953147, -3.8268343487))
        make_face()
        with BuildLine():
            ThreePointArc((7.0710677906, -7.0710678332), (6.4278760738, -7.6604444506), (5.7357643388, -8.1915204602))
            Line((5.7357643388, -8.1915204602), (6.1372678425, -8.7649268924))
            ThreePointArc((6.1372678425, -8.7649268924), (6.877827399, -8.1966755621), (7.5660425359, -7.5660425815))
            Line((7.5660425359, -7.5660425815), (7.0710677906, -7.0710678332))
        make_face()
        with BuildLine():
            ThreePointArc((3.826834293, -9.2387953378), (3.0070579634, -9.5371695174), (2.164396107, -9.7629600784))
            Line((2.164396107, -9.7629600784), (2.3159038345, -10.4463672839))
            ThreePointArc((2.3159038345, -10.4463672839), (3.2175520209, -10.2047713837), (4.0947126935, -9.8855110114))
            Line((4.0947126935, -9.8855110114), (3.826834293, -9.2387953378))
        make_face()
        with BuildLine():
            ThreePointArc((-3.62e-08, -10), (-0.8715574635, -9.9619469778), (-1.7364818123, -9.8480775238))
            Line((-1.7364818123, -9.8480775238), (-1.8580355391, -10.5374429505))
            ThreePointArc((-1.8580355391, -10.5374429505), (-0.9325664859, -10.6592832662), (-3.87e-08, -10.7))
            Line((-3.87e-08, -10.7), (-3.62e-08, -10))
        make_face()
        with BuildLine():
            ThreePointArc((-3.8268343598, -9.2387953101), (-4.6174861671, -8.8701083137), (-5.3729961165, -8.4339144371))
            Line((-5.3729961165, -8.4339144371), (-5.7491058447, -9.0242884477))
            ThreePointArc((-5.7491058447, -9.0242884477), (-4.9407101988, -9.4910158957), (-4.094712765, -9.8855109818))
            Line((-4.094712765, -9.8855109818), (-3.8268343598, -9.2387953101))
        make_face()
        with BuildLine():
            ThreePointArc((-7.0710678417, -7.071067782), (-7.6604444583, -6.4278760646), (-8.1915204671, -5.735764329))
            Line((-8.1915204671, -5.735764329), (-8.7649268998, -6.137267832))
            ThreePointArc((-8.7649268998, -6.137267832), (-8.1966755704, -6.8778273891), (-7.5660425906, -7.5660425268))
            Line((-7.5660425906, -7.5660425268), (-7.0710678417, -7.071067782))
        make_face()
        with BuildLine():
            ThreePointArc((-9.2387953424, -3.8268342819), (-9.5371695211, -3.0070579519), (-9.762960081, -2.1643960953))
            Line((-9.762960081, -2.1643960953), (-10.4463672866, -2.3159038219))
            ThreePointArc((-10.4463672866, -2.3159038219), (-10.2047713875, -3.2175520086), (-9.8855110164, -4.0947126816))
            Line((-9.8855110164, -4.0947126816), (-9.2387953424, -3.8268342819))
        make_face()
    extrude(amount=F4_DEPTH)


solid = f1.part
